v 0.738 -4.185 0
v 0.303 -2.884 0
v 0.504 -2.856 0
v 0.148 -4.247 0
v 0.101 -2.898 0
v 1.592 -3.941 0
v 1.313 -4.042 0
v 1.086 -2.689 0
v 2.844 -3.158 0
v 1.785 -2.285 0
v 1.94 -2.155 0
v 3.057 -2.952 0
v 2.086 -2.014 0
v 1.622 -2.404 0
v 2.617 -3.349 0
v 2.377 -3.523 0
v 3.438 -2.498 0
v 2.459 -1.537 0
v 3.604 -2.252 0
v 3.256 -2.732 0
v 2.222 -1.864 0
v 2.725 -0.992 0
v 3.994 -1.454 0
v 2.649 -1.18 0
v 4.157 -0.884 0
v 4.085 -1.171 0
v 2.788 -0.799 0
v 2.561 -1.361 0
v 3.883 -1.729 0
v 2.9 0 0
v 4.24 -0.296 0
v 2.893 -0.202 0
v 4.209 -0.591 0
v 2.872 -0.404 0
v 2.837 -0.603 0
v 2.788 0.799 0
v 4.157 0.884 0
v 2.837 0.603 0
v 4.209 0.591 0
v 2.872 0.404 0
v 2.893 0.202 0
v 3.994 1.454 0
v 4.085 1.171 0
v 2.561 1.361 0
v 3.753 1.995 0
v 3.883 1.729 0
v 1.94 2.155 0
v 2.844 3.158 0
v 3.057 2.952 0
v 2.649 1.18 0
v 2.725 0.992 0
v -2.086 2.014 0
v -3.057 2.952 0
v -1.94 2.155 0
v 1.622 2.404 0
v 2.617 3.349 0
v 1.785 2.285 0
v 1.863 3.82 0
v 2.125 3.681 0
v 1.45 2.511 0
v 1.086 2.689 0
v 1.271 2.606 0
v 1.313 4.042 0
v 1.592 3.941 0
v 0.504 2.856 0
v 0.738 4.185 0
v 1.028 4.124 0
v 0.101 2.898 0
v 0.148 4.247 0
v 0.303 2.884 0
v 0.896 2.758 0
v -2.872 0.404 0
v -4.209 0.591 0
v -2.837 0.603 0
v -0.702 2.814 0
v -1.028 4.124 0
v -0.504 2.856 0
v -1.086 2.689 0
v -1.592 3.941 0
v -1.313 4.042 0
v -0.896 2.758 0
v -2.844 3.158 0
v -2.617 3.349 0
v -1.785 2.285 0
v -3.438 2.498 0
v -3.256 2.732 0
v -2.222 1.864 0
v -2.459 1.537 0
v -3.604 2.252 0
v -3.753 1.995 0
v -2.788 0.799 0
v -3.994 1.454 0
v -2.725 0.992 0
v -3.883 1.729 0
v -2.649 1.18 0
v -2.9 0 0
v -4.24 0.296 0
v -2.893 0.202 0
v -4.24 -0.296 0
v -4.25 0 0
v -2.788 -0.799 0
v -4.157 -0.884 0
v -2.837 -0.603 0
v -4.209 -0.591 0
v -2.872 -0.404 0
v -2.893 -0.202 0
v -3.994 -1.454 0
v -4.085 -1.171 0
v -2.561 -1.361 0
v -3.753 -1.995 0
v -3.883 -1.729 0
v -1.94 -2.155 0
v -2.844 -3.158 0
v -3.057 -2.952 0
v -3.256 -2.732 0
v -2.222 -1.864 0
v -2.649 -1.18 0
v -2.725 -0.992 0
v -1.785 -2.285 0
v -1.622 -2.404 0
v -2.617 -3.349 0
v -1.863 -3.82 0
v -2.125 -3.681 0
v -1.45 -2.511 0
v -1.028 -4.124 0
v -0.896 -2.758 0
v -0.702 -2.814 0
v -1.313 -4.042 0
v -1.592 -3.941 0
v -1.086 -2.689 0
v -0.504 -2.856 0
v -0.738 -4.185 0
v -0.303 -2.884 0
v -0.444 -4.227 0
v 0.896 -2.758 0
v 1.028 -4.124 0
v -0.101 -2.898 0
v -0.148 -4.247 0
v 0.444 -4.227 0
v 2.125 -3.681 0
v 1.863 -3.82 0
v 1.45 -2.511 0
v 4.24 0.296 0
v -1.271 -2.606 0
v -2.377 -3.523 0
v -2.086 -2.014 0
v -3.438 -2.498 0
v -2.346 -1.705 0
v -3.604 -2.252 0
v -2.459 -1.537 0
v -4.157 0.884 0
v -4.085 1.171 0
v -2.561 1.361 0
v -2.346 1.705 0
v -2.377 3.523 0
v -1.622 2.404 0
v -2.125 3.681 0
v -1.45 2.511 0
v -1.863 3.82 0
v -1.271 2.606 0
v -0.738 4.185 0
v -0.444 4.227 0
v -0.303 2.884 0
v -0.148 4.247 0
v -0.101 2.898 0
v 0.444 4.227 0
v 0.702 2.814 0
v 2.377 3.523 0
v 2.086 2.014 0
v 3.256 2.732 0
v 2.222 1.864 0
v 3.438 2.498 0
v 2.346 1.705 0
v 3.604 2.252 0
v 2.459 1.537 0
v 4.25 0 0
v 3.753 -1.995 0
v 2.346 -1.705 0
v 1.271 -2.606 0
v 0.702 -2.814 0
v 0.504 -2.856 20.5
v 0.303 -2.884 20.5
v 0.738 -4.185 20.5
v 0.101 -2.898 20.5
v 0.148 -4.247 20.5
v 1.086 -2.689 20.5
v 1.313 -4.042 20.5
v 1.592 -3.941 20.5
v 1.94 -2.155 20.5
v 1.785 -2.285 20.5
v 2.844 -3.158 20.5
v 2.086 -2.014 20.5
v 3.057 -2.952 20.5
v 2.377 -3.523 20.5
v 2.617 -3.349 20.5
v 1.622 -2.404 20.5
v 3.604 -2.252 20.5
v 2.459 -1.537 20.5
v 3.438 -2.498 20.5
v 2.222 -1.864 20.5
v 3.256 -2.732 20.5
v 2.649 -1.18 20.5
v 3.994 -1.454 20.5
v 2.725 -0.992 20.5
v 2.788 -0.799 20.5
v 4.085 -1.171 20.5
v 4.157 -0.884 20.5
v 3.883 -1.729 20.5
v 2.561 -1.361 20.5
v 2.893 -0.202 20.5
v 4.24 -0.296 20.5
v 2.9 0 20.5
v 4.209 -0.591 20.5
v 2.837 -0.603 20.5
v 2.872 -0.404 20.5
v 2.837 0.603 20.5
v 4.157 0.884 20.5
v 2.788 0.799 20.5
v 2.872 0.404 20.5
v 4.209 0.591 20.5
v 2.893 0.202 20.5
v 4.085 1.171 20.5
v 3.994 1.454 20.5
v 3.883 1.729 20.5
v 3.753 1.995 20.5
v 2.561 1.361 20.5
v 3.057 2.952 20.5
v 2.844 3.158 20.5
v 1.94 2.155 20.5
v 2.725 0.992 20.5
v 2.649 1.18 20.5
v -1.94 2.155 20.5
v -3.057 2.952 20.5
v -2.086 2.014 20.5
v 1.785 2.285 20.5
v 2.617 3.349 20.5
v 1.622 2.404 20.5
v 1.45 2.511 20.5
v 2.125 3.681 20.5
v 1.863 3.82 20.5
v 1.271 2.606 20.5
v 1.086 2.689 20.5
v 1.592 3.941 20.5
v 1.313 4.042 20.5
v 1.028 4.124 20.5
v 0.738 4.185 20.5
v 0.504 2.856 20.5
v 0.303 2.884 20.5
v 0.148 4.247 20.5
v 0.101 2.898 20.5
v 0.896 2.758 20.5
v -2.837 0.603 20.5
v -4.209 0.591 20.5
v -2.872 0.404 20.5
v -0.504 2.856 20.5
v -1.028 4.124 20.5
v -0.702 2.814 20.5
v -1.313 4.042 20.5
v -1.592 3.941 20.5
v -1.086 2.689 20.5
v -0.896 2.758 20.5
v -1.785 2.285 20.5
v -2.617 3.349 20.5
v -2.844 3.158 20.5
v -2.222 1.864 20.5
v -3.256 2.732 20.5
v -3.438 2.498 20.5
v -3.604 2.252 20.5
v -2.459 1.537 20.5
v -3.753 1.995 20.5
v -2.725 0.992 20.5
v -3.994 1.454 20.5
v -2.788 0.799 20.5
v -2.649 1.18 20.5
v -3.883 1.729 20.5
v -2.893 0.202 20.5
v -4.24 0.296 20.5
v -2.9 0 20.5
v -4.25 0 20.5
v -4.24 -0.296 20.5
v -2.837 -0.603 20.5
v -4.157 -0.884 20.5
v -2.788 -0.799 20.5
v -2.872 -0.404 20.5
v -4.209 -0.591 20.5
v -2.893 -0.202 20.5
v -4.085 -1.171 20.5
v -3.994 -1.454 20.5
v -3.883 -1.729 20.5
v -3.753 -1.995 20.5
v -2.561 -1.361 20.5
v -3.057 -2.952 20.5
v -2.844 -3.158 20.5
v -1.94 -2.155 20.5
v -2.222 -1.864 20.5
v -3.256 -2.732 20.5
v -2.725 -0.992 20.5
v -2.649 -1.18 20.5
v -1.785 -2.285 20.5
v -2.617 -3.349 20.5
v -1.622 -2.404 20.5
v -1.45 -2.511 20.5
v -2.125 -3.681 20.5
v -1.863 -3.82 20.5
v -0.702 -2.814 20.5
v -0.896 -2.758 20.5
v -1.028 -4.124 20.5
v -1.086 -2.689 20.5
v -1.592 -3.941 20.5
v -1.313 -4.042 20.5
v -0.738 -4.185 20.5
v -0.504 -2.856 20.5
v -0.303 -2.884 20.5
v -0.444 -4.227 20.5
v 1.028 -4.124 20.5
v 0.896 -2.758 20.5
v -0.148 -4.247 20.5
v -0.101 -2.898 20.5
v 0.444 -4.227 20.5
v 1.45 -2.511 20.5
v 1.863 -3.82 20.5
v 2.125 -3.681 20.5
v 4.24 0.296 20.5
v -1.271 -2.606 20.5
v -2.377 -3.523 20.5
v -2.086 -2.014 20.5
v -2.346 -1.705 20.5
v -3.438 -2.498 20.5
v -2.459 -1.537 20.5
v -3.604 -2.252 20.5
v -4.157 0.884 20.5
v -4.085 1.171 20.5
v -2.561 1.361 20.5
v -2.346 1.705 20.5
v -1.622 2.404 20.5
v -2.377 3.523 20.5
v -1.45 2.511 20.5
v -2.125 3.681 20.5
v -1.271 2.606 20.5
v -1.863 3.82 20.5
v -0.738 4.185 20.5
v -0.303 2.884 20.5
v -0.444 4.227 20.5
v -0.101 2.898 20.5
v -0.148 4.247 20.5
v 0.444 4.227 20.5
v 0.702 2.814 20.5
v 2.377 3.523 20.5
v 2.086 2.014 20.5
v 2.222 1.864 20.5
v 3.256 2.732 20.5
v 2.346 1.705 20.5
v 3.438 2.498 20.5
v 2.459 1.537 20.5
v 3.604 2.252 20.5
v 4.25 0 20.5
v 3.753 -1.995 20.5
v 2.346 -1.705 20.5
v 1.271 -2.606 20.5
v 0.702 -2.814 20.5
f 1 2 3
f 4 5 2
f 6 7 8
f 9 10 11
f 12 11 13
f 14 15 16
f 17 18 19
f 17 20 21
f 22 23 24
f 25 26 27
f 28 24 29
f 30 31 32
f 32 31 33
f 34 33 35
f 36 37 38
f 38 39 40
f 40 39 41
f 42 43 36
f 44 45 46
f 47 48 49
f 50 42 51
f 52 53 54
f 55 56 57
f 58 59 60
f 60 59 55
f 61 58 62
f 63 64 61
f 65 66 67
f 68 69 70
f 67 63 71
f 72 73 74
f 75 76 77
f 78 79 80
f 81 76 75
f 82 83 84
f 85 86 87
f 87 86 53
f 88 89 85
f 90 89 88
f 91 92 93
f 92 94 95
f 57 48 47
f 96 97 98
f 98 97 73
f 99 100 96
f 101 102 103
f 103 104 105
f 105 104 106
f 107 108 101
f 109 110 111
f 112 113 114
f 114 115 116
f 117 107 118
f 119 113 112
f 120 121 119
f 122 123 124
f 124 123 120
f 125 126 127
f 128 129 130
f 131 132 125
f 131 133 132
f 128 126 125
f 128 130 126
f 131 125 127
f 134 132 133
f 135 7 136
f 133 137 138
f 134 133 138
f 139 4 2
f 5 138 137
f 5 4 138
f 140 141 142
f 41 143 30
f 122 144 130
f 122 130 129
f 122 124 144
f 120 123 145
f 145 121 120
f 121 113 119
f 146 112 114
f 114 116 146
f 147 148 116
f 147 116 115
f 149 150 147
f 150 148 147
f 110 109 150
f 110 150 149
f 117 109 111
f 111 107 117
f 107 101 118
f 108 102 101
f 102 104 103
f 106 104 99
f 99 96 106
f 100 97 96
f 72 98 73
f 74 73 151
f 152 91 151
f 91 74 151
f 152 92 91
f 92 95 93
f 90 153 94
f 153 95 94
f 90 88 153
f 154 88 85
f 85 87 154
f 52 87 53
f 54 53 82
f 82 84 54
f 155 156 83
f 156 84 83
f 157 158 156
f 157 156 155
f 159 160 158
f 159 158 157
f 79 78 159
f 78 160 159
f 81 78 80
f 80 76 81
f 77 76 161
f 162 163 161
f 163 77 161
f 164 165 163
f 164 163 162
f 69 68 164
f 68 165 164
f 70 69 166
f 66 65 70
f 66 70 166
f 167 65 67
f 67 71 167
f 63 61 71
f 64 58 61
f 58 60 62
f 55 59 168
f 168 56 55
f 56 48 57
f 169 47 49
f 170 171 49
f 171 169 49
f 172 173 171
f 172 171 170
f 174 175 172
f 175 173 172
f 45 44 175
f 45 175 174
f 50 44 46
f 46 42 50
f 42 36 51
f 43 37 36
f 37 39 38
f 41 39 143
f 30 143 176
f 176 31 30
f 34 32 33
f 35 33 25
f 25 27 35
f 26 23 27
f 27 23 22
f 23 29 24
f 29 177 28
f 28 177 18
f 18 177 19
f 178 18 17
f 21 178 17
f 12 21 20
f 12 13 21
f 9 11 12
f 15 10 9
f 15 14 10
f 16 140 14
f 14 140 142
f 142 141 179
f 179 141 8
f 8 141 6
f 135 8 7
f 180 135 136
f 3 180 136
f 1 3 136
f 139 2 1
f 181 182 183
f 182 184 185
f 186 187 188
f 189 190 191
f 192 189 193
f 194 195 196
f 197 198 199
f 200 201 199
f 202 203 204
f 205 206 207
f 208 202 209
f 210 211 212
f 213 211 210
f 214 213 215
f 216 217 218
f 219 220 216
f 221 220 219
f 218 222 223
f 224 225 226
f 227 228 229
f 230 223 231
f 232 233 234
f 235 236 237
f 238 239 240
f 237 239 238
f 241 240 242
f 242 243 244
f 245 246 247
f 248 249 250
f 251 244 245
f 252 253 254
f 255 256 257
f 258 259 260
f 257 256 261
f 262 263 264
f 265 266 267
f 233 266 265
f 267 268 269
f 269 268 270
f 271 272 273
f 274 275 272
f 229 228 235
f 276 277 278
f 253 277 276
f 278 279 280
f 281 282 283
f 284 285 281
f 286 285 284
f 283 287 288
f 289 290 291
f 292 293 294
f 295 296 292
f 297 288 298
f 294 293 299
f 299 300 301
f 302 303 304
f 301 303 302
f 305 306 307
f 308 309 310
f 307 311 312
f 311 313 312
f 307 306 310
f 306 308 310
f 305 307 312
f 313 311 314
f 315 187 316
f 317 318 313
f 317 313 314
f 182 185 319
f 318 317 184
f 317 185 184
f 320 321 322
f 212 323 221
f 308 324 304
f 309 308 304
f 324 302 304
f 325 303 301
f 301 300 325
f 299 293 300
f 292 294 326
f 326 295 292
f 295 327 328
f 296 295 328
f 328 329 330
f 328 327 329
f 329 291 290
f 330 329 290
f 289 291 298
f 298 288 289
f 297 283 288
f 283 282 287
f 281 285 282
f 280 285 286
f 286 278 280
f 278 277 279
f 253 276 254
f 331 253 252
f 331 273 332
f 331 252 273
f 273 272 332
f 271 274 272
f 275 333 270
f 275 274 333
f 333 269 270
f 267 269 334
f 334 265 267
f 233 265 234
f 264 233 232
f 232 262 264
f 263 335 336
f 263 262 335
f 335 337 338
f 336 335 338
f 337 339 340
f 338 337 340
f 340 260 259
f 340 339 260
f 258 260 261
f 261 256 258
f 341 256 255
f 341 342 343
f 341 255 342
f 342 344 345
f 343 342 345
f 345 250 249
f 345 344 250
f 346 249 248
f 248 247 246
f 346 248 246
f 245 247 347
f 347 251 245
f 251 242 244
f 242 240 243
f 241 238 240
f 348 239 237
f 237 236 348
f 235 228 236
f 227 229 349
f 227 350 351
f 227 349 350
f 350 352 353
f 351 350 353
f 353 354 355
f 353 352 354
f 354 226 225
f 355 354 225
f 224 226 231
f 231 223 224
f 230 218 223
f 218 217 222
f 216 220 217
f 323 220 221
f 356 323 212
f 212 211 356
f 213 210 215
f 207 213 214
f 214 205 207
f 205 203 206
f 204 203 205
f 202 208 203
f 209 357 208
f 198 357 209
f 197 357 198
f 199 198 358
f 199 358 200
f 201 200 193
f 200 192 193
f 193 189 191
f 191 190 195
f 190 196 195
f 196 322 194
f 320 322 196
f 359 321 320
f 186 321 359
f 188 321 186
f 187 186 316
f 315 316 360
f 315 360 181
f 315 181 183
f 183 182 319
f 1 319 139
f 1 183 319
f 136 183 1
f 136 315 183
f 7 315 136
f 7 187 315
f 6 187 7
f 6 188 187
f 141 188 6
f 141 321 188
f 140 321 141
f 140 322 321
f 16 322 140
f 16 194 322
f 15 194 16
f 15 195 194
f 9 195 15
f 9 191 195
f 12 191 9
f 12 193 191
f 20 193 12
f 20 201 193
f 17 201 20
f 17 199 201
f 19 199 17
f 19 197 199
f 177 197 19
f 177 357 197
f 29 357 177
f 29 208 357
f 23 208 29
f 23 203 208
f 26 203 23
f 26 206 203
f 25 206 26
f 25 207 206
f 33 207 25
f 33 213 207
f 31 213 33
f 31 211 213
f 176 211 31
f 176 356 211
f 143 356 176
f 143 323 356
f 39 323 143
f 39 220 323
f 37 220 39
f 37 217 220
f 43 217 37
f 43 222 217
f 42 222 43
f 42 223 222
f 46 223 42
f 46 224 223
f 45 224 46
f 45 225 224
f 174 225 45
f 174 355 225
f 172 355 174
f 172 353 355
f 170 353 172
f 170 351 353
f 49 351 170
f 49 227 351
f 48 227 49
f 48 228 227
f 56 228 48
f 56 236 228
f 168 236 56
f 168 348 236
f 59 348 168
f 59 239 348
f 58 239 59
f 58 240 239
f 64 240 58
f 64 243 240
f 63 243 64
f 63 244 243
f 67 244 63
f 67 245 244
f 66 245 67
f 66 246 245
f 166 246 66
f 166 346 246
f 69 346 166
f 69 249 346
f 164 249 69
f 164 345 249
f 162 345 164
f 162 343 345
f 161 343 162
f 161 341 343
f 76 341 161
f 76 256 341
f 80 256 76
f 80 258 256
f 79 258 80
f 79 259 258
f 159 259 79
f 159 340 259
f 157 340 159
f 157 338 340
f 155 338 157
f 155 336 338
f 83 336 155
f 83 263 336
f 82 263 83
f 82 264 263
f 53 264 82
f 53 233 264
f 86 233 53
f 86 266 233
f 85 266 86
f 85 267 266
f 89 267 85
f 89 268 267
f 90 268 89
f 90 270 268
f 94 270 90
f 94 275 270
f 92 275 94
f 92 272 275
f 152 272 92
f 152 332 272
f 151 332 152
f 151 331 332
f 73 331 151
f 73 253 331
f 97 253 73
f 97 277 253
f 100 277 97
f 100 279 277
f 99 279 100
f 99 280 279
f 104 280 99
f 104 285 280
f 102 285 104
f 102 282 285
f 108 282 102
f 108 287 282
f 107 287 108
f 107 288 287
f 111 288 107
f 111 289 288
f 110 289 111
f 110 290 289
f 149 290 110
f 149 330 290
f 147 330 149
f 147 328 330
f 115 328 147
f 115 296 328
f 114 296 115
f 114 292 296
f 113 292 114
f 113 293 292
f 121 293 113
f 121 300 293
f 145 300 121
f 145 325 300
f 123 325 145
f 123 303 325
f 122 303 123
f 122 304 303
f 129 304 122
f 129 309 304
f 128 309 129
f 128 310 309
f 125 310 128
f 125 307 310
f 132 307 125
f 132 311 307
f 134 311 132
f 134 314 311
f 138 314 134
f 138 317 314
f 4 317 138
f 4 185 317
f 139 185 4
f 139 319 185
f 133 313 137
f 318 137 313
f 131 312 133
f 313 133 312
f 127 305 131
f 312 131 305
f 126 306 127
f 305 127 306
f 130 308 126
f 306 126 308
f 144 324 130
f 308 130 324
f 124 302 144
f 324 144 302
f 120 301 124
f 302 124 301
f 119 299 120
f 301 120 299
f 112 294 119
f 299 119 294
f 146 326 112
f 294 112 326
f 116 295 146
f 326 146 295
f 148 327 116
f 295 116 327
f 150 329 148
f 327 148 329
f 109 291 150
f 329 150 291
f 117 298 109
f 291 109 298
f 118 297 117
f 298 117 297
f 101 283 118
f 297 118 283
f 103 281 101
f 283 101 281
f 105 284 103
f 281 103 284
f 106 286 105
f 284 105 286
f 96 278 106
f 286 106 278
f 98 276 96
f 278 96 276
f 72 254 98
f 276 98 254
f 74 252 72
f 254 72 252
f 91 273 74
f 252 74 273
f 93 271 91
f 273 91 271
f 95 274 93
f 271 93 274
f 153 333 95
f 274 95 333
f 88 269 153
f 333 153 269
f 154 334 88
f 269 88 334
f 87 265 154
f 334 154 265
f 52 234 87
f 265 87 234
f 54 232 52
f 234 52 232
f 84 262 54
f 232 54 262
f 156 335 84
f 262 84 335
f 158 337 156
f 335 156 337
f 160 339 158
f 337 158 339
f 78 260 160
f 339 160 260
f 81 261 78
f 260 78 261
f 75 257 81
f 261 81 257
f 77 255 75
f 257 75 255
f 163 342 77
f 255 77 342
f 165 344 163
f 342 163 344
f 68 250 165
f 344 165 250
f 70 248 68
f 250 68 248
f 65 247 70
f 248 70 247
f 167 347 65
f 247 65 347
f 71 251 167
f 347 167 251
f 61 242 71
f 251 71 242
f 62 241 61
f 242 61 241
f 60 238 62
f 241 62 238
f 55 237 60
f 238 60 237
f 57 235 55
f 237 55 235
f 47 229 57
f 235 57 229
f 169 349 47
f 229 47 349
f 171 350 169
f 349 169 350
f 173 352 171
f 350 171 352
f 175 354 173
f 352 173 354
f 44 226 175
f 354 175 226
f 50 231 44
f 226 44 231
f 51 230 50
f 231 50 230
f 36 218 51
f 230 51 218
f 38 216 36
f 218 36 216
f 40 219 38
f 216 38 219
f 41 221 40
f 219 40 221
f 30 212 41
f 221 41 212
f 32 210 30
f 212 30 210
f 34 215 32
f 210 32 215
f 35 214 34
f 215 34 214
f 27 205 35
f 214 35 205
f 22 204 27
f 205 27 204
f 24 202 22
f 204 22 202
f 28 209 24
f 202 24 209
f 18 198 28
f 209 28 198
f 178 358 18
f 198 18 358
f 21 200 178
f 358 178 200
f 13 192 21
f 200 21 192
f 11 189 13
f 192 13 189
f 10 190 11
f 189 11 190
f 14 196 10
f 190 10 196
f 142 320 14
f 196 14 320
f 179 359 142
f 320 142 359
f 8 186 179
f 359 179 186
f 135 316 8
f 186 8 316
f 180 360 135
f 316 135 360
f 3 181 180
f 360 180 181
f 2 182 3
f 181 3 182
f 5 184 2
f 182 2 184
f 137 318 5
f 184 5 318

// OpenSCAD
$fa = 4;
$fs = 0.01;

linear_extrude(20.5) {
	difference() {
		circle(d = 8.5);
		circle(d = 5.8);
	}
}
